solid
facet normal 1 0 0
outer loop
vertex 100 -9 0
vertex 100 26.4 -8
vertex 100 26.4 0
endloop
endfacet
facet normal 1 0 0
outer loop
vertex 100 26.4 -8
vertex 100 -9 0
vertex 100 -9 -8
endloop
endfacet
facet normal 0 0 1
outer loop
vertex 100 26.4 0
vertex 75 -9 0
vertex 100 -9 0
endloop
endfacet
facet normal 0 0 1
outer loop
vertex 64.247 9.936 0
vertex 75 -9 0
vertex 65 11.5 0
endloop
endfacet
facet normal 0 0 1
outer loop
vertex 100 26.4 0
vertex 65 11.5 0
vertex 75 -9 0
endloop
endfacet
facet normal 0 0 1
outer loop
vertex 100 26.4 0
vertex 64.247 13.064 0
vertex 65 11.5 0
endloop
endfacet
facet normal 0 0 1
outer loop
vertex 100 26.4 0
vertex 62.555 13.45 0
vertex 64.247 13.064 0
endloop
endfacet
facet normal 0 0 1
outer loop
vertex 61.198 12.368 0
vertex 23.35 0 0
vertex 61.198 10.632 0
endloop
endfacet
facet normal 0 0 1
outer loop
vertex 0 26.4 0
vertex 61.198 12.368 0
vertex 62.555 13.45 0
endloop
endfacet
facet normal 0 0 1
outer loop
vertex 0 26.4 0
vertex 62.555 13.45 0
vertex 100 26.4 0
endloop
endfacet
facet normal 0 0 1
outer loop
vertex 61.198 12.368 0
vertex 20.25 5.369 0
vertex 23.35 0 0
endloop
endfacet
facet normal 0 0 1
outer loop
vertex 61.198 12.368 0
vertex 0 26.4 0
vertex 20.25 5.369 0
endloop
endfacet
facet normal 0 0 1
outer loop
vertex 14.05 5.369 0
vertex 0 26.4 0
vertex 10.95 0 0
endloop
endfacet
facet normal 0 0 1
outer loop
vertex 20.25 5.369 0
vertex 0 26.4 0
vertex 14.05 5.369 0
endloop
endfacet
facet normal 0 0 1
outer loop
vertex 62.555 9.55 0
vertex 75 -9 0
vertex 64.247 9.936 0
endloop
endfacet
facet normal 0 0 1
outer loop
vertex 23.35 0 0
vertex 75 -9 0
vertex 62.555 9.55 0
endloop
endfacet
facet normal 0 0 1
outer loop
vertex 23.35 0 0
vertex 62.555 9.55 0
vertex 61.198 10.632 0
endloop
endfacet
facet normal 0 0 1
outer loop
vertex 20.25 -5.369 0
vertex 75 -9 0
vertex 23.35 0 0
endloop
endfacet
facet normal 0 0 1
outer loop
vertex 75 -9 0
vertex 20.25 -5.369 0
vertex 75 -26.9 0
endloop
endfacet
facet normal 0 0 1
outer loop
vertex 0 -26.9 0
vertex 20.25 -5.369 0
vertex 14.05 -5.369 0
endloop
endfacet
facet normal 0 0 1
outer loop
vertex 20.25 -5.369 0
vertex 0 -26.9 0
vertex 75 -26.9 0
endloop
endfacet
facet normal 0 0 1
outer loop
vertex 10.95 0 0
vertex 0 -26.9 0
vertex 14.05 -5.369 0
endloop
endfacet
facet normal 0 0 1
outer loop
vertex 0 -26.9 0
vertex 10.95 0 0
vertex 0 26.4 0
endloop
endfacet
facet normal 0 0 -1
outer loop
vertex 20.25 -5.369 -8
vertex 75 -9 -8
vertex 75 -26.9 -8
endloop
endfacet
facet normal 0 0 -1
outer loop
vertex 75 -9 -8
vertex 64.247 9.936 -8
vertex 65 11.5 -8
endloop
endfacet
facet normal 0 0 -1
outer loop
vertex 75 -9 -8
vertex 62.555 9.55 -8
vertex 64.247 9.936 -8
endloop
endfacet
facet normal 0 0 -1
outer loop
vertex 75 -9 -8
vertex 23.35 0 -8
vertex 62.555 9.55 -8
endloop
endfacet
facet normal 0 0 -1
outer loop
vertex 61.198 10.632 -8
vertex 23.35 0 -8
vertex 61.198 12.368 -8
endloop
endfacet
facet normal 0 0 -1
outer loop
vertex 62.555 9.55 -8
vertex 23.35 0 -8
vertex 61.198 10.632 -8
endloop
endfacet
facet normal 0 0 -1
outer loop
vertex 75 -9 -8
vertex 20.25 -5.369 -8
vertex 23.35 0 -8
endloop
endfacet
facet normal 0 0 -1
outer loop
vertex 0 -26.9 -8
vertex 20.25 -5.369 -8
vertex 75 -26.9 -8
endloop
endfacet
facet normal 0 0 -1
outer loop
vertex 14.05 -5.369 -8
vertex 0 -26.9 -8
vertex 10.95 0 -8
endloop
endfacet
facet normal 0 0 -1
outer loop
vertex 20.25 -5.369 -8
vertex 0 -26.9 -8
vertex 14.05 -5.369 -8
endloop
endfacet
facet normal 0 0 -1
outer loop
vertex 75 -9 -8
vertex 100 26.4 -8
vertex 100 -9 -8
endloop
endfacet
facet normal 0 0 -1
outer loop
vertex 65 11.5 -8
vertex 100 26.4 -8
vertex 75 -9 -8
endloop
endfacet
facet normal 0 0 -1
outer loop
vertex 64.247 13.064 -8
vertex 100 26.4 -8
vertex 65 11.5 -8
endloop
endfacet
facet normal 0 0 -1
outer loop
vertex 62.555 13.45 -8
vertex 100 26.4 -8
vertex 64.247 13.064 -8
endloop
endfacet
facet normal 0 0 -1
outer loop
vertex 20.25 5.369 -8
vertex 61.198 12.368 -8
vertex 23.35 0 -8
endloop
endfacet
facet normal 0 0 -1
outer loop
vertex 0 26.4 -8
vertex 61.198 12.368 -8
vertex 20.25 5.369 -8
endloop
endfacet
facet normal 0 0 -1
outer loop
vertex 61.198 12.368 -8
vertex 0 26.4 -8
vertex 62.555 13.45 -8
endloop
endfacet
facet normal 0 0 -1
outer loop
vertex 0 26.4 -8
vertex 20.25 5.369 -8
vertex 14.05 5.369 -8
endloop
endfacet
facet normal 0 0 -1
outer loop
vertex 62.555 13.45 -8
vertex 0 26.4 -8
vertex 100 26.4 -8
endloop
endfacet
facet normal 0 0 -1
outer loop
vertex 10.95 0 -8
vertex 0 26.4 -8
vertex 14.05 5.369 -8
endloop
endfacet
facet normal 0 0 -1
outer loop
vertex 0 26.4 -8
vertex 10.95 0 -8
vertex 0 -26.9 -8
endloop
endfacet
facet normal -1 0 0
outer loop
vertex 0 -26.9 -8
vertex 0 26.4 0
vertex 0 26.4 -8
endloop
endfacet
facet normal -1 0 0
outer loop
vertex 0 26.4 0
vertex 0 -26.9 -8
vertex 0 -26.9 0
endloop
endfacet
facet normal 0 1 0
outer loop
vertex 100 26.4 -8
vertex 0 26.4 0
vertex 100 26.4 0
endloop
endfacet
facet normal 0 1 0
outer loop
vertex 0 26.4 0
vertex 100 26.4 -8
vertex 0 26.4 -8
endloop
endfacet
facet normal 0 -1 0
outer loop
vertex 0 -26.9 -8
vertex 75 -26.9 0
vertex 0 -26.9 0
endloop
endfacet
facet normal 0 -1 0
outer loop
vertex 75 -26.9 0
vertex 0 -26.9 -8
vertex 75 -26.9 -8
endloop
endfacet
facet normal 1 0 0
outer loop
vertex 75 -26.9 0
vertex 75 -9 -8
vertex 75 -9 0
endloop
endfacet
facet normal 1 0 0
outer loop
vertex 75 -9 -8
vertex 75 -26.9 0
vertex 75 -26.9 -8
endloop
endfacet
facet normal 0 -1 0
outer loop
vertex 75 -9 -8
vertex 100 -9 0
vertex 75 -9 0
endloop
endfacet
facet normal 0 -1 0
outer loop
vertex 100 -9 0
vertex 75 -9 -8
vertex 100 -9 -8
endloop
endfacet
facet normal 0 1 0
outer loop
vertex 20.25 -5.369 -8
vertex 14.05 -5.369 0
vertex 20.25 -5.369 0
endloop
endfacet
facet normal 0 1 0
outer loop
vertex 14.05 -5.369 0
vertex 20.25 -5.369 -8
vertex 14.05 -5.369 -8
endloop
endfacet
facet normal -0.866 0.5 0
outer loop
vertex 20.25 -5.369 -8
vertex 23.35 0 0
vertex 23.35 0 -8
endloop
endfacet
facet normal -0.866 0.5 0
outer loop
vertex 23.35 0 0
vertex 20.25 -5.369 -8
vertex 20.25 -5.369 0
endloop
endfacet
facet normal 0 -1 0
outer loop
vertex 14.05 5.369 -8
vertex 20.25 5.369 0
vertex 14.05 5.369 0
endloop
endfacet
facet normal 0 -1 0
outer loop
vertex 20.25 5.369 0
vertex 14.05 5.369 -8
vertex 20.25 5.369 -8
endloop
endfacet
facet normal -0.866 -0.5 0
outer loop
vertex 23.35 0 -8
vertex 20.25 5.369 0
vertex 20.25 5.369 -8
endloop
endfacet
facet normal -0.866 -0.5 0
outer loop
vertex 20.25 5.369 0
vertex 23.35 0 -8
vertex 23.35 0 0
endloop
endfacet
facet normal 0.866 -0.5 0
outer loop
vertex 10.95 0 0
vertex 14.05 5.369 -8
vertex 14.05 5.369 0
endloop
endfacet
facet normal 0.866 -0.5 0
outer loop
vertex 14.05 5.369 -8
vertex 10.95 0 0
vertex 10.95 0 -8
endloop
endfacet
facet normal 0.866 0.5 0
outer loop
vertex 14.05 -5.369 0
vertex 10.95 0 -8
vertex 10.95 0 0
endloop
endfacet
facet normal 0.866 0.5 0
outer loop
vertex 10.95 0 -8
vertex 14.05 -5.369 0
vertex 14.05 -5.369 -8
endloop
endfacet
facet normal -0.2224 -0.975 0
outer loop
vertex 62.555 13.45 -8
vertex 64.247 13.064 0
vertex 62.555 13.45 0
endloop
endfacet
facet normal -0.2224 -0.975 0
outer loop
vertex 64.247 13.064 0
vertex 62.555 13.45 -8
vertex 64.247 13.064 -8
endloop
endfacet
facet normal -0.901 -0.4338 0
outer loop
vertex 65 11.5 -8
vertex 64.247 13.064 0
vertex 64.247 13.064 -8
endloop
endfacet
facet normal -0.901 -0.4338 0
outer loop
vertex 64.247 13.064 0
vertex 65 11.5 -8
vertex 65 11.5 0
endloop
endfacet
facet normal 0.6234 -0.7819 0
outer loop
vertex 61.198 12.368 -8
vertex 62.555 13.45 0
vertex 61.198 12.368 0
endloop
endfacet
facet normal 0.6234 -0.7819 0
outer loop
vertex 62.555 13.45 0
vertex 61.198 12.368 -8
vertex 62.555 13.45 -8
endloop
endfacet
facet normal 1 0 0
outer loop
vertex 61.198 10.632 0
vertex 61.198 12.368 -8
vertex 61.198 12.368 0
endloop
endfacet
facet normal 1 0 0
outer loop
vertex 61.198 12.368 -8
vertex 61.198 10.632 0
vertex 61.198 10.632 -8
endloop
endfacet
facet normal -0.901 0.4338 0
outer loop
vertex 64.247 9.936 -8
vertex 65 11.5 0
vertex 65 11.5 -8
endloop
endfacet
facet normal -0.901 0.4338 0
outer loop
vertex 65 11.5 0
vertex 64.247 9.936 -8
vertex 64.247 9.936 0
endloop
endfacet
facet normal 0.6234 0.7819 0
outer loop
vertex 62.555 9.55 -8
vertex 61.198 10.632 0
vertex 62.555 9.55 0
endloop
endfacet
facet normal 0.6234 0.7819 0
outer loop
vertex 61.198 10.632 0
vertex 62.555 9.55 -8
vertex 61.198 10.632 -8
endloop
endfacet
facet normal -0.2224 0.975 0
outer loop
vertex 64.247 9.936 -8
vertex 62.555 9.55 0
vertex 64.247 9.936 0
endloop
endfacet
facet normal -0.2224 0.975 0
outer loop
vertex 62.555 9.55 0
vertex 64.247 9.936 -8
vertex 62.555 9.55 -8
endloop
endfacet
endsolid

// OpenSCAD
boxDepth=8;
boxLReduct=10;
translate([37.6,0,0]) {
    //import("Arduino_uno_R3_clip_Base_Rv_02.stl");
    difference() {
        union() {
            //import("Arduino_uno_R3_clip_Base_Rv_02.stl");
            translate([-37.6,-26.9,-boxDepth])
                cube([110-boxLReduct,53.3,boxDepth]);
        }
        //translate([85-37.6-boxLReduct,9,-boxDepth])
            //cube([30,30,boxDepth]);
        translate([85-37.6-boxLReduct,-9-30,-boxDepth])
            cube([30,30,boxDepth]);
        //translate([85-37.6-boxLReduct,-10,-boxDepth])
          //  cube([25,20,boxDepth]);
        translate([10-37.6+14.3/2,0,-boxDepth])
            cylinder(h=14,d=12.4,$fn=6);
        translate([100-37.6-35-2,13.5-2, -boxDepth])
            cylinder(h=14,d=4);
    }
}
